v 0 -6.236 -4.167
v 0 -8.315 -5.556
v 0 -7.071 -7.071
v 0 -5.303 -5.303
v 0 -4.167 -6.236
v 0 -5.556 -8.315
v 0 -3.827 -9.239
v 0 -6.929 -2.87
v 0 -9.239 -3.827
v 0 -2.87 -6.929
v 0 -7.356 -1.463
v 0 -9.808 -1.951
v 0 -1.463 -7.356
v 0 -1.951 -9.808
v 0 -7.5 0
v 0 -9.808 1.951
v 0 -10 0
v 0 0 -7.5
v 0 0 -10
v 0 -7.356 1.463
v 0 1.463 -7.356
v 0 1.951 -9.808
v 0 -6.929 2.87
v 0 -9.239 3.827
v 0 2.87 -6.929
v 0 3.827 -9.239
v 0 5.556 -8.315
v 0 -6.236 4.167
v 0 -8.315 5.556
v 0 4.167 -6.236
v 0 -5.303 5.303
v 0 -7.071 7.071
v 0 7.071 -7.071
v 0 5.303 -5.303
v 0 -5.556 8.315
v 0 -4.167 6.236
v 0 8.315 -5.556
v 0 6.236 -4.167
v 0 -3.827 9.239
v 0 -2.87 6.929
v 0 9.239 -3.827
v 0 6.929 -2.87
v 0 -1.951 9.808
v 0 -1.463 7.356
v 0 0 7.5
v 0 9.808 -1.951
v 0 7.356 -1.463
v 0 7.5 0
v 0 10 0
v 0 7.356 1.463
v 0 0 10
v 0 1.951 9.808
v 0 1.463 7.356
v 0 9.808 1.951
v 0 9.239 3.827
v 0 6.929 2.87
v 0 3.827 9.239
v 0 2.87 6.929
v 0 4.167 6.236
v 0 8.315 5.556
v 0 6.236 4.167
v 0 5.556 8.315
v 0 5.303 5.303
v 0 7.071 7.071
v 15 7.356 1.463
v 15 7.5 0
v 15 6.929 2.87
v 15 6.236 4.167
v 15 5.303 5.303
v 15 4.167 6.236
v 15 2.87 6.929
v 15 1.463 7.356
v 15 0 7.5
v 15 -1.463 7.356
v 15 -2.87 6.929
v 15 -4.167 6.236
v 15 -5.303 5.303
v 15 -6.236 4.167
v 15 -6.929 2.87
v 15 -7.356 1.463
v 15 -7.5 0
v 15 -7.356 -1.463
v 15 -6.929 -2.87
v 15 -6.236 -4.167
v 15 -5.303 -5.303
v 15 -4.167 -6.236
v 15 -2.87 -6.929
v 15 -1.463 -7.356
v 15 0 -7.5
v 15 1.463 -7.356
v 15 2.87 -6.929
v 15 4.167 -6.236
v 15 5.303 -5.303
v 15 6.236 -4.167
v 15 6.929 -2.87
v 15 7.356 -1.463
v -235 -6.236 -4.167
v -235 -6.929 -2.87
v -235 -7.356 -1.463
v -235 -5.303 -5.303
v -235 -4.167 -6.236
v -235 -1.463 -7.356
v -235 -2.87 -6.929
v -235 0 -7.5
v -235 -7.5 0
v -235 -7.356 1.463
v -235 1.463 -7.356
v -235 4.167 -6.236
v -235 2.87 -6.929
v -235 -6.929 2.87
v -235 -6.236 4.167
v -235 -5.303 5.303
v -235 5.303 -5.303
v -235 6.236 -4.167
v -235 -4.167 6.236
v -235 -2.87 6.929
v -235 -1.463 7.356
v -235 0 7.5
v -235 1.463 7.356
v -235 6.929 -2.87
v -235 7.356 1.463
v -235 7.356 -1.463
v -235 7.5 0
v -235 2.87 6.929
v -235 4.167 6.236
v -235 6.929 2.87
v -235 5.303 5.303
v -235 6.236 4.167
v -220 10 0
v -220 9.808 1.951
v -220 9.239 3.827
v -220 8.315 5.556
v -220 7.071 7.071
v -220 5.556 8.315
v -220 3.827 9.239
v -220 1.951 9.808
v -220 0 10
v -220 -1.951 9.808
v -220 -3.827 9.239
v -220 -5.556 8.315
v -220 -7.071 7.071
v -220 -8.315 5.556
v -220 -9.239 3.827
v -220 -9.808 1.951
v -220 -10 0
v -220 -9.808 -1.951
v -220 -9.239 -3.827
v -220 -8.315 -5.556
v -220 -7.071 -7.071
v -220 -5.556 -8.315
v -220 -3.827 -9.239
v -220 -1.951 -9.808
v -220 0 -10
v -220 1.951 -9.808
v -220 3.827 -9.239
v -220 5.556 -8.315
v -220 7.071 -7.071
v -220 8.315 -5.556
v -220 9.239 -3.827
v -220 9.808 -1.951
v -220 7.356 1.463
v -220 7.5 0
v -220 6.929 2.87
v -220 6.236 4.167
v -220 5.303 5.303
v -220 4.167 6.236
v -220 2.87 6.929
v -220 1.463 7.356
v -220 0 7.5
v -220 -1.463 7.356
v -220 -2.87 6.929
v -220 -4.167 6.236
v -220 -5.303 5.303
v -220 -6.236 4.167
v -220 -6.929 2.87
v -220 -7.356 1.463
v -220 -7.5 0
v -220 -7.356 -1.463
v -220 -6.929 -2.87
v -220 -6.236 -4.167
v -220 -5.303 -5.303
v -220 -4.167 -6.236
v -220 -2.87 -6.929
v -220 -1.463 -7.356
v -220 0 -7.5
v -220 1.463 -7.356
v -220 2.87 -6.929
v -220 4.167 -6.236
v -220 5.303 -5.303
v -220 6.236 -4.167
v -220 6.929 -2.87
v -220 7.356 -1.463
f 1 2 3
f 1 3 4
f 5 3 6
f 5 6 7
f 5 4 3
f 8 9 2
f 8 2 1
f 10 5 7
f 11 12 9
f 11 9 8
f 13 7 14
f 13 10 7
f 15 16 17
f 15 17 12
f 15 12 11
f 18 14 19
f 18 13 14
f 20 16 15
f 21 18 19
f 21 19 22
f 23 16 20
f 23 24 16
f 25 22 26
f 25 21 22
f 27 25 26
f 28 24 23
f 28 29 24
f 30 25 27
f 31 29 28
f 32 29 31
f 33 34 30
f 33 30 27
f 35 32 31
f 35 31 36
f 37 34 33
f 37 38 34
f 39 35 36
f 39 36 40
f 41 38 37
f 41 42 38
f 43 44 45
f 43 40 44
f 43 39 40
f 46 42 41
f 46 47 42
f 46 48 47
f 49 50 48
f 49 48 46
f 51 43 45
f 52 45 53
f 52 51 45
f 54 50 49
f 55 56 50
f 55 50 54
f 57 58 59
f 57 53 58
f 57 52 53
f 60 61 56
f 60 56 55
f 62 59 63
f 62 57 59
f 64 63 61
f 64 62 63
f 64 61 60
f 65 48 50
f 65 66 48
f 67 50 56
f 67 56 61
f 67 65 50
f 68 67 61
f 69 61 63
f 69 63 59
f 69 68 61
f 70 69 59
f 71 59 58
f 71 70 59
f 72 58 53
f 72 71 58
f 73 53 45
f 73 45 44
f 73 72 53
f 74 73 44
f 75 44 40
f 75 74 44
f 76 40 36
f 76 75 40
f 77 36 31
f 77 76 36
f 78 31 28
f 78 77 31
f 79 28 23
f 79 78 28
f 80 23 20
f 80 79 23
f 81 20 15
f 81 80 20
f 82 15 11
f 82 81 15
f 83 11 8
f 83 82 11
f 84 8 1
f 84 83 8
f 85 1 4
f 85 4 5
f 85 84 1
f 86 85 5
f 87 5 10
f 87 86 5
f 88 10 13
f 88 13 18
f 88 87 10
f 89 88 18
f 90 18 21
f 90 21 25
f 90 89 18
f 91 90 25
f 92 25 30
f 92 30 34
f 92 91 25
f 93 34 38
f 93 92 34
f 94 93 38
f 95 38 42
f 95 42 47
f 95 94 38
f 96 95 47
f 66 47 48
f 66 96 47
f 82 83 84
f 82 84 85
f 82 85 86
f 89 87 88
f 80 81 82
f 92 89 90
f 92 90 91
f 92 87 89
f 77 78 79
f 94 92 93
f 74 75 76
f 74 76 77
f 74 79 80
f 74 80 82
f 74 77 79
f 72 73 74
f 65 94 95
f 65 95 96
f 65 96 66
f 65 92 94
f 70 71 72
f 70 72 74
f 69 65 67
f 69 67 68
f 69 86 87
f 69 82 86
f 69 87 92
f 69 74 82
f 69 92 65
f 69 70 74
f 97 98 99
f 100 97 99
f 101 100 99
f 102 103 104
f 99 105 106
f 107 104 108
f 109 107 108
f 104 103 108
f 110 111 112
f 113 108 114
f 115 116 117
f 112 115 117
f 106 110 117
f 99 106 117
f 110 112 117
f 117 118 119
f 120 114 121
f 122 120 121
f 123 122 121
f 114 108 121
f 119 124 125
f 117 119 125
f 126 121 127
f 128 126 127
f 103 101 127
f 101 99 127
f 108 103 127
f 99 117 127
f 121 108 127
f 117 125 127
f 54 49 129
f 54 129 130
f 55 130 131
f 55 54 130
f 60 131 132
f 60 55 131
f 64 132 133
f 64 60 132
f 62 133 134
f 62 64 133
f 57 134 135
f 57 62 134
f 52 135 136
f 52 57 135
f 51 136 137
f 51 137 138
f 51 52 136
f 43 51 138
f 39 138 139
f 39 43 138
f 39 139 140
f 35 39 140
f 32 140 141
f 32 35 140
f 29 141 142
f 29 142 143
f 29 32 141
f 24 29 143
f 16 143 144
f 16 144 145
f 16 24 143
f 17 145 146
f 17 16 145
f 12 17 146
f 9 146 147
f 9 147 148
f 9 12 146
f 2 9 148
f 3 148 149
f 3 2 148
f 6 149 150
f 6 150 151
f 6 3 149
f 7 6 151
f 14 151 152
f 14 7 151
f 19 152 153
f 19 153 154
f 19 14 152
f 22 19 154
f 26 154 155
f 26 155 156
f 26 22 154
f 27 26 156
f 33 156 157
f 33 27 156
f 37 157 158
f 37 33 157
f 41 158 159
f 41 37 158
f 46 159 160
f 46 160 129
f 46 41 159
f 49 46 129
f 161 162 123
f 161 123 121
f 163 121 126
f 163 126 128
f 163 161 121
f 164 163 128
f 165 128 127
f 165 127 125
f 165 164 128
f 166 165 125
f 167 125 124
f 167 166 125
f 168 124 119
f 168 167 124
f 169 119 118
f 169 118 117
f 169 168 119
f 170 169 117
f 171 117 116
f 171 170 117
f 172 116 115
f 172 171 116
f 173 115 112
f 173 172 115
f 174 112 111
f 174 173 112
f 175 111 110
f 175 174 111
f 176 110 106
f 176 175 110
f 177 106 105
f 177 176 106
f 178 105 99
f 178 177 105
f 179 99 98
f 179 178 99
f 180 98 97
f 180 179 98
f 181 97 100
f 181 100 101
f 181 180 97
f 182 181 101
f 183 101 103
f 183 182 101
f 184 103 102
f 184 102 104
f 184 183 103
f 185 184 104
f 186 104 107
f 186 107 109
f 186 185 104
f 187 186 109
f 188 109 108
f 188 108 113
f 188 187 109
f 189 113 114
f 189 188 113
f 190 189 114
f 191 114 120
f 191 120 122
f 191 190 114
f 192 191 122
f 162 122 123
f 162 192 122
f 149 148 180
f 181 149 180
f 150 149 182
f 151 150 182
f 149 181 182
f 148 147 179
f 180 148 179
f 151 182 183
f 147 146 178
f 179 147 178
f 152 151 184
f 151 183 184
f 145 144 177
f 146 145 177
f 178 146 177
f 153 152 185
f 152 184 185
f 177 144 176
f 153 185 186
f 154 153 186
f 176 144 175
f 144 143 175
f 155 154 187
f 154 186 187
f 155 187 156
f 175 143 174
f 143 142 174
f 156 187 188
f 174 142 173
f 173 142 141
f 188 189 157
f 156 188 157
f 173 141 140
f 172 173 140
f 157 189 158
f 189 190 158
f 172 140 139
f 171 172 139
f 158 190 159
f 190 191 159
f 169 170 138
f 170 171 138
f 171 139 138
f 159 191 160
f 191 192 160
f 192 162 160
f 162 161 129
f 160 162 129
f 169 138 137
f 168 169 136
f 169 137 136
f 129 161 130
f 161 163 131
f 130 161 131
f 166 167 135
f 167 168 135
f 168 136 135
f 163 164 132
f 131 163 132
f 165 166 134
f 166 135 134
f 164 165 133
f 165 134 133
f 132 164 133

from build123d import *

# Parameters (mm, degrees)
F0_R          = 7.5
F1_DEPTH      = 15
F1_DEPTH_BACK = 235
F0_R_2        = 10
F2_DEPTH      = 220


with BuildPart() as f1:
    # F0 (on Right) → F1 (new body, two sides)
    with BuildSketch(Plane.YZ) as f1_sk:
        Circle(F0_R)
    extrude(amount=F1_DEPTH)
    extrude(f1_sk.sketch, amount=-F1_DEPTH_BACK)

    # F0 (on Right) → F2 (join)
    with BuildSketch(Plane.YZ):
        Circle(F0_R_2)
        Circle(F0_R, mode=Mode.SUBTRACT)
    extrude(amount=-F2_DEPTH)


solid = f1.part
